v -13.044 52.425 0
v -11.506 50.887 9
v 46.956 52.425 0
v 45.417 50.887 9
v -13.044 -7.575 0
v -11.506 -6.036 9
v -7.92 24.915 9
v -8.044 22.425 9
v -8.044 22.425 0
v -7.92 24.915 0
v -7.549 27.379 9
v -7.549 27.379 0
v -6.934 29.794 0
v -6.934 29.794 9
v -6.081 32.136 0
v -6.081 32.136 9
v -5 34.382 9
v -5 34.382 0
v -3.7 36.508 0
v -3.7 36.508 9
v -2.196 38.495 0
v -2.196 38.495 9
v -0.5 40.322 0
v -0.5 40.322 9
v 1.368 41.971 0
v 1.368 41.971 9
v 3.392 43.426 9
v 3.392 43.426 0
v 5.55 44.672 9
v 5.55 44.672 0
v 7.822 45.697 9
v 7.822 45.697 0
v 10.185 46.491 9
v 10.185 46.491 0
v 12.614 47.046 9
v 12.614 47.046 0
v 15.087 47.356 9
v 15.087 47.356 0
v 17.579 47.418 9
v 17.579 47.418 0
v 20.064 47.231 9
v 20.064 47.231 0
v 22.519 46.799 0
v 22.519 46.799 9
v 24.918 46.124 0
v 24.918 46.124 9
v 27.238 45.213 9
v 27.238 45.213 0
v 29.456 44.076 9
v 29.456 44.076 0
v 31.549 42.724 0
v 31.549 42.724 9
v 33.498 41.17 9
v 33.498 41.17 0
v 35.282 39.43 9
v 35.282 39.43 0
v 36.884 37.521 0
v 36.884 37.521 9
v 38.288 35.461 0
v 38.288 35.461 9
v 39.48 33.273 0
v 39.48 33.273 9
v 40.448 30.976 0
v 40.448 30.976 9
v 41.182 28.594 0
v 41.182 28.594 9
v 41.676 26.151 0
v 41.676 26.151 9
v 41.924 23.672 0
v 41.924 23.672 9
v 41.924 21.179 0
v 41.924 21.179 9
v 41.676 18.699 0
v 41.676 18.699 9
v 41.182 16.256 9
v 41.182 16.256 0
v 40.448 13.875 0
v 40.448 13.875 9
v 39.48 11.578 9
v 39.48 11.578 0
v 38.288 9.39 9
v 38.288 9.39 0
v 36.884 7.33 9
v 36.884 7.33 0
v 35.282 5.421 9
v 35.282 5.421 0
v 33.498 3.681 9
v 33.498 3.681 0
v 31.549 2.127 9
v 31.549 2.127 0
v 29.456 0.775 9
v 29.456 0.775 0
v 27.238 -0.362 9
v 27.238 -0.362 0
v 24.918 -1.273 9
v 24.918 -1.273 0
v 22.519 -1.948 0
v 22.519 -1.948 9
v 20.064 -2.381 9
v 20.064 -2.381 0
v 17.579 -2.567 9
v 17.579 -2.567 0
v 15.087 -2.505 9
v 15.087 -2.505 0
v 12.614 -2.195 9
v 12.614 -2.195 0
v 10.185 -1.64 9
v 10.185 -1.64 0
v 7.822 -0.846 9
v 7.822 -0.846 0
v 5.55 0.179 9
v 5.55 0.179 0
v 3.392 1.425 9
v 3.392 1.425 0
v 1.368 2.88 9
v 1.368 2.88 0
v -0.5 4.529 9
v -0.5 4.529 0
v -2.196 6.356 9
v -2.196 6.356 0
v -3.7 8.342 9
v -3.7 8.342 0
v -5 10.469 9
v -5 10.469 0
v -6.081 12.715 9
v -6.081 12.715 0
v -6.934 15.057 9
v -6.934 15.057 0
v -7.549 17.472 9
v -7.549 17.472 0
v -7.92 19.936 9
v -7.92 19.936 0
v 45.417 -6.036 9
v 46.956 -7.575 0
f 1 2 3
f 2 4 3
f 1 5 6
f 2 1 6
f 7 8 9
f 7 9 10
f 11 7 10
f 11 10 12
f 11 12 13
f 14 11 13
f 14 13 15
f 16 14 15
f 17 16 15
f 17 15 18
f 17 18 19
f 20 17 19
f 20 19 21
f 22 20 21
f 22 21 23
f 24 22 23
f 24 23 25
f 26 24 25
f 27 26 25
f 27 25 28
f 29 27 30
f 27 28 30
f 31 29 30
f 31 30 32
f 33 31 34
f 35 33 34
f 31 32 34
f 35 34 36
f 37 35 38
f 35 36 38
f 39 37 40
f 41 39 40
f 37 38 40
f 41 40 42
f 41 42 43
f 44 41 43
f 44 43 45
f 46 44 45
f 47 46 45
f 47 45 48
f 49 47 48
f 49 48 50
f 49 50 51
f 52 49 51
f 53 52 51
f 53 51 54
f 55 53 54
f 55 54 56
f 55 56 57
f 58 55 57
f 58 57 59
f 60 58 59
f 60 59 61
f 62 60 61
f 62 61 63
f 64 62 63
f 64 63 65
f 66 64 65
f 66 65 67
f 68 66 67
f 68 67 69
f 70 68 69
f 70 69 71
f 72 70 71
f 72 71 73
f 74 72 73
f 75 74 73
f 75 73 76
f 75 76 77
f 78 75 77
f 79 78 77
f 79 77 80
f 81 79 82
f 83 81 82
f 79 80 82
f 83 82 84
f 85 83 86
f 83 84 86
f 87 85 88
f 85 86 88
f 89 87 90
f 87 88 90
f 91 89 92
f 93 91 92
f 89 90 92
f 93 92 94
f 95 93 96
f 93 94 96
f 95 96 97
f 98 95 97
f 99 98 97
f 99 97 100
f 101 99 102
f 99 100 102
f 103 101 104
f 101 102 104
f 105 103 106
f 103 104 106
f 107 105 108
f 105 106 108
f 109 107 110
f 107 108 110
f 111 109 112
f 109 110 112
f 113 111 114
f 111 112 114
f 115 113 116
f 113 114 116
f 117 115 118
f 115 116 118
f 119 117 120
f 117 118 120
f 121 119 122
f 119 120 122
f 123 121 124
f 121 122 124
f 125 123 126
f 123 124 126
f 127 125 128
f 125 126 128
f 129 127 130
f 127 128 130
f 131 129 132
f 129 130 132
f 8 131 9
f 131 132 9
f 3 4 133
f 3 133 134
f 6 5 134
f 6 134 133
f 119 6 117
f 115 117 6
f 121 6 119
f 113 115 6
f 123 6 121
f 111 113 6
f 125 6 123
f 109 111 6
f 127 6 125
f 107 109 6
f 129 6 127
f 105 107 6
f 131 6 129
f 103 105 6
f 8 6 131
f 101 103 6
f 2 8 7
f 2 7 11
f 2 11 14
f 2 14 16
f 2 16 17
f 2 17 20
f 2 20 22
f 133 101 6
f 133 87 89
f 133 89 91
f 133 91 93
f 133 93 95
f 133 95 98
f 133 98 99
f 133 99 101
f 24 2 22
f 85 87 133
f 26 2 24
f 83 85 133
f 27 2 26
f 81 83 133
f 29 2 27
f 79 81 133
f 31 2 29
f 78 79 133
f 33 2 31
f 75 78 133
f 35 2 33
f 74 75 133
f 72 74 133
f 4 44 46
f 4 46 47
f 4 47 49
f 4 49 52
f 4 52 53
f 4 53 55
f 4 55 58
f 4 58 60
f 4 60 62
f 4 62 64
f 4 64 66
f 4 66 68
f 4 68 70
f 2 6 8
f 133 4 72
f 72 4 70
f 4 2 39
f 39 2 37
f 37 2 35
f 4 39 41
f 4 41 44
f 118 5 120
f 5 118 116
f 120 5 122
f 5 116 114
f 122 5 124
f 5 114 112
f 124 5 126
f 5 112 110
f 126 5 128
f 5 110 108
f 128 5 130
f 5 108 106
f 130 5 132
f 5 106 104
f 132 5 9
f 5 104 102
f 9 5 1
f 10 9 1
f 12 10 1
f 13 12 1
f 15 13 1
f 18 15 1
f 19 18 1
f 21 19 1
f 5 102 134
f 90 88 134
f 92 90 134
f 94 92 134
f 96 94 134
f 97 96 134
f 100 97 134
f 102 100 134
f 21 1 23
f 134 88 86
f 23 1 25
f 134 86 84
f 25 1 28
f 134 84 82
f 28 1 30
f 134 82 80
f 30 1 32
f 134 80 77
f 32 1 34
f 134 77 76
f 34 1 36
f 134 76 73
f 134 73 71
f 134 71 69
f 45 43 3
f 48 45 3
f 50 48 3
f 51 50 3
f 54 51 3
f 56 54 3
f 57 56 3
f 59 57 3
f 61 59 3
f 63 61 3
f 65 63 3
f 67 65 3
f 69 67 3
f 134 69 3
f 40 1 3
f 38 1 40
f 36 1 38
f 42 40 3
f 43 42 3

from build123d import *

# Parameters (mm, degrees)
F0_W     = 60
F0_H     = 60
F1_DEPTH = 9
F4_DEPTH = 25
F5_DEPTH = 50
F6_DEPTH = 55
F7_DEPTH = 25
F9_D     = 50


with BuildPart() as f1:
    # F0 (on Top) → F1 (new body)
    with BuildSketch(Plane.XY):
        with Locations((16.955535, 22.425423)):
            Rectangle(F0_W, F0_H)
    extrude(amount=F1_DEPTH)

    # F2 (on Right) → F4 (cut)
    with BuildSketch(Plane.YZ):
        Polygon((-7.574577, 9), (-7.574577, 0), (-6.036178, 9), align=None)
        Polygon((50.887025, 9), (52.425423, 0), (52.425423, 9), align=None)
    extrude(amount=-F4_DEPTH, mode=Mode.SUBTRACT)

    # F2 (on Right) → F5 (cut)
    with BuildSketch(Plane.YZ):
        Polygon((-7.574577, 9), (-7.574577, 0), (-6.036178, 9), align=None)
        Polygon((50.887025, 9), (52.425423, 0), (52.425423, 9), align=None)
    extrude(amount=F5_DEPTH, mode=Mode.SUBTRACT)

    # F3 (on Front) → F6 (cut)
    with BuildSketch(Plane.XZ):
        Polygon((-13.044465, 9), (-13.044465, 0), (-11.506067, 9), align=None)
        Polygon((45.417137, 9), (46.955535, 0), (46.955535, 9), align=None)
    extrude(amount=-F6_DEPTH, mode=Mode.SUBTRACT)

    # F3 (on Front) → F7 (cut)
    with BuildSketch(Plane.XZ):
        Polygon((-13.044465, 9), (-13.044465, 0), (-11.506067, 9), align=None)
        Polygon((45.417137, 9), (46.955535, 0), (46.955535, 9), align=None)
    extrude(amount=F7_DEPTH, mode=Mode.SUBTRACT)

    # F9 (through all)
    with Locations(Plane.XY.offset(9)):
        with Locations((16.955535, 22.425423)):
            Hole(F9_D / 2)


solid = f1.part
